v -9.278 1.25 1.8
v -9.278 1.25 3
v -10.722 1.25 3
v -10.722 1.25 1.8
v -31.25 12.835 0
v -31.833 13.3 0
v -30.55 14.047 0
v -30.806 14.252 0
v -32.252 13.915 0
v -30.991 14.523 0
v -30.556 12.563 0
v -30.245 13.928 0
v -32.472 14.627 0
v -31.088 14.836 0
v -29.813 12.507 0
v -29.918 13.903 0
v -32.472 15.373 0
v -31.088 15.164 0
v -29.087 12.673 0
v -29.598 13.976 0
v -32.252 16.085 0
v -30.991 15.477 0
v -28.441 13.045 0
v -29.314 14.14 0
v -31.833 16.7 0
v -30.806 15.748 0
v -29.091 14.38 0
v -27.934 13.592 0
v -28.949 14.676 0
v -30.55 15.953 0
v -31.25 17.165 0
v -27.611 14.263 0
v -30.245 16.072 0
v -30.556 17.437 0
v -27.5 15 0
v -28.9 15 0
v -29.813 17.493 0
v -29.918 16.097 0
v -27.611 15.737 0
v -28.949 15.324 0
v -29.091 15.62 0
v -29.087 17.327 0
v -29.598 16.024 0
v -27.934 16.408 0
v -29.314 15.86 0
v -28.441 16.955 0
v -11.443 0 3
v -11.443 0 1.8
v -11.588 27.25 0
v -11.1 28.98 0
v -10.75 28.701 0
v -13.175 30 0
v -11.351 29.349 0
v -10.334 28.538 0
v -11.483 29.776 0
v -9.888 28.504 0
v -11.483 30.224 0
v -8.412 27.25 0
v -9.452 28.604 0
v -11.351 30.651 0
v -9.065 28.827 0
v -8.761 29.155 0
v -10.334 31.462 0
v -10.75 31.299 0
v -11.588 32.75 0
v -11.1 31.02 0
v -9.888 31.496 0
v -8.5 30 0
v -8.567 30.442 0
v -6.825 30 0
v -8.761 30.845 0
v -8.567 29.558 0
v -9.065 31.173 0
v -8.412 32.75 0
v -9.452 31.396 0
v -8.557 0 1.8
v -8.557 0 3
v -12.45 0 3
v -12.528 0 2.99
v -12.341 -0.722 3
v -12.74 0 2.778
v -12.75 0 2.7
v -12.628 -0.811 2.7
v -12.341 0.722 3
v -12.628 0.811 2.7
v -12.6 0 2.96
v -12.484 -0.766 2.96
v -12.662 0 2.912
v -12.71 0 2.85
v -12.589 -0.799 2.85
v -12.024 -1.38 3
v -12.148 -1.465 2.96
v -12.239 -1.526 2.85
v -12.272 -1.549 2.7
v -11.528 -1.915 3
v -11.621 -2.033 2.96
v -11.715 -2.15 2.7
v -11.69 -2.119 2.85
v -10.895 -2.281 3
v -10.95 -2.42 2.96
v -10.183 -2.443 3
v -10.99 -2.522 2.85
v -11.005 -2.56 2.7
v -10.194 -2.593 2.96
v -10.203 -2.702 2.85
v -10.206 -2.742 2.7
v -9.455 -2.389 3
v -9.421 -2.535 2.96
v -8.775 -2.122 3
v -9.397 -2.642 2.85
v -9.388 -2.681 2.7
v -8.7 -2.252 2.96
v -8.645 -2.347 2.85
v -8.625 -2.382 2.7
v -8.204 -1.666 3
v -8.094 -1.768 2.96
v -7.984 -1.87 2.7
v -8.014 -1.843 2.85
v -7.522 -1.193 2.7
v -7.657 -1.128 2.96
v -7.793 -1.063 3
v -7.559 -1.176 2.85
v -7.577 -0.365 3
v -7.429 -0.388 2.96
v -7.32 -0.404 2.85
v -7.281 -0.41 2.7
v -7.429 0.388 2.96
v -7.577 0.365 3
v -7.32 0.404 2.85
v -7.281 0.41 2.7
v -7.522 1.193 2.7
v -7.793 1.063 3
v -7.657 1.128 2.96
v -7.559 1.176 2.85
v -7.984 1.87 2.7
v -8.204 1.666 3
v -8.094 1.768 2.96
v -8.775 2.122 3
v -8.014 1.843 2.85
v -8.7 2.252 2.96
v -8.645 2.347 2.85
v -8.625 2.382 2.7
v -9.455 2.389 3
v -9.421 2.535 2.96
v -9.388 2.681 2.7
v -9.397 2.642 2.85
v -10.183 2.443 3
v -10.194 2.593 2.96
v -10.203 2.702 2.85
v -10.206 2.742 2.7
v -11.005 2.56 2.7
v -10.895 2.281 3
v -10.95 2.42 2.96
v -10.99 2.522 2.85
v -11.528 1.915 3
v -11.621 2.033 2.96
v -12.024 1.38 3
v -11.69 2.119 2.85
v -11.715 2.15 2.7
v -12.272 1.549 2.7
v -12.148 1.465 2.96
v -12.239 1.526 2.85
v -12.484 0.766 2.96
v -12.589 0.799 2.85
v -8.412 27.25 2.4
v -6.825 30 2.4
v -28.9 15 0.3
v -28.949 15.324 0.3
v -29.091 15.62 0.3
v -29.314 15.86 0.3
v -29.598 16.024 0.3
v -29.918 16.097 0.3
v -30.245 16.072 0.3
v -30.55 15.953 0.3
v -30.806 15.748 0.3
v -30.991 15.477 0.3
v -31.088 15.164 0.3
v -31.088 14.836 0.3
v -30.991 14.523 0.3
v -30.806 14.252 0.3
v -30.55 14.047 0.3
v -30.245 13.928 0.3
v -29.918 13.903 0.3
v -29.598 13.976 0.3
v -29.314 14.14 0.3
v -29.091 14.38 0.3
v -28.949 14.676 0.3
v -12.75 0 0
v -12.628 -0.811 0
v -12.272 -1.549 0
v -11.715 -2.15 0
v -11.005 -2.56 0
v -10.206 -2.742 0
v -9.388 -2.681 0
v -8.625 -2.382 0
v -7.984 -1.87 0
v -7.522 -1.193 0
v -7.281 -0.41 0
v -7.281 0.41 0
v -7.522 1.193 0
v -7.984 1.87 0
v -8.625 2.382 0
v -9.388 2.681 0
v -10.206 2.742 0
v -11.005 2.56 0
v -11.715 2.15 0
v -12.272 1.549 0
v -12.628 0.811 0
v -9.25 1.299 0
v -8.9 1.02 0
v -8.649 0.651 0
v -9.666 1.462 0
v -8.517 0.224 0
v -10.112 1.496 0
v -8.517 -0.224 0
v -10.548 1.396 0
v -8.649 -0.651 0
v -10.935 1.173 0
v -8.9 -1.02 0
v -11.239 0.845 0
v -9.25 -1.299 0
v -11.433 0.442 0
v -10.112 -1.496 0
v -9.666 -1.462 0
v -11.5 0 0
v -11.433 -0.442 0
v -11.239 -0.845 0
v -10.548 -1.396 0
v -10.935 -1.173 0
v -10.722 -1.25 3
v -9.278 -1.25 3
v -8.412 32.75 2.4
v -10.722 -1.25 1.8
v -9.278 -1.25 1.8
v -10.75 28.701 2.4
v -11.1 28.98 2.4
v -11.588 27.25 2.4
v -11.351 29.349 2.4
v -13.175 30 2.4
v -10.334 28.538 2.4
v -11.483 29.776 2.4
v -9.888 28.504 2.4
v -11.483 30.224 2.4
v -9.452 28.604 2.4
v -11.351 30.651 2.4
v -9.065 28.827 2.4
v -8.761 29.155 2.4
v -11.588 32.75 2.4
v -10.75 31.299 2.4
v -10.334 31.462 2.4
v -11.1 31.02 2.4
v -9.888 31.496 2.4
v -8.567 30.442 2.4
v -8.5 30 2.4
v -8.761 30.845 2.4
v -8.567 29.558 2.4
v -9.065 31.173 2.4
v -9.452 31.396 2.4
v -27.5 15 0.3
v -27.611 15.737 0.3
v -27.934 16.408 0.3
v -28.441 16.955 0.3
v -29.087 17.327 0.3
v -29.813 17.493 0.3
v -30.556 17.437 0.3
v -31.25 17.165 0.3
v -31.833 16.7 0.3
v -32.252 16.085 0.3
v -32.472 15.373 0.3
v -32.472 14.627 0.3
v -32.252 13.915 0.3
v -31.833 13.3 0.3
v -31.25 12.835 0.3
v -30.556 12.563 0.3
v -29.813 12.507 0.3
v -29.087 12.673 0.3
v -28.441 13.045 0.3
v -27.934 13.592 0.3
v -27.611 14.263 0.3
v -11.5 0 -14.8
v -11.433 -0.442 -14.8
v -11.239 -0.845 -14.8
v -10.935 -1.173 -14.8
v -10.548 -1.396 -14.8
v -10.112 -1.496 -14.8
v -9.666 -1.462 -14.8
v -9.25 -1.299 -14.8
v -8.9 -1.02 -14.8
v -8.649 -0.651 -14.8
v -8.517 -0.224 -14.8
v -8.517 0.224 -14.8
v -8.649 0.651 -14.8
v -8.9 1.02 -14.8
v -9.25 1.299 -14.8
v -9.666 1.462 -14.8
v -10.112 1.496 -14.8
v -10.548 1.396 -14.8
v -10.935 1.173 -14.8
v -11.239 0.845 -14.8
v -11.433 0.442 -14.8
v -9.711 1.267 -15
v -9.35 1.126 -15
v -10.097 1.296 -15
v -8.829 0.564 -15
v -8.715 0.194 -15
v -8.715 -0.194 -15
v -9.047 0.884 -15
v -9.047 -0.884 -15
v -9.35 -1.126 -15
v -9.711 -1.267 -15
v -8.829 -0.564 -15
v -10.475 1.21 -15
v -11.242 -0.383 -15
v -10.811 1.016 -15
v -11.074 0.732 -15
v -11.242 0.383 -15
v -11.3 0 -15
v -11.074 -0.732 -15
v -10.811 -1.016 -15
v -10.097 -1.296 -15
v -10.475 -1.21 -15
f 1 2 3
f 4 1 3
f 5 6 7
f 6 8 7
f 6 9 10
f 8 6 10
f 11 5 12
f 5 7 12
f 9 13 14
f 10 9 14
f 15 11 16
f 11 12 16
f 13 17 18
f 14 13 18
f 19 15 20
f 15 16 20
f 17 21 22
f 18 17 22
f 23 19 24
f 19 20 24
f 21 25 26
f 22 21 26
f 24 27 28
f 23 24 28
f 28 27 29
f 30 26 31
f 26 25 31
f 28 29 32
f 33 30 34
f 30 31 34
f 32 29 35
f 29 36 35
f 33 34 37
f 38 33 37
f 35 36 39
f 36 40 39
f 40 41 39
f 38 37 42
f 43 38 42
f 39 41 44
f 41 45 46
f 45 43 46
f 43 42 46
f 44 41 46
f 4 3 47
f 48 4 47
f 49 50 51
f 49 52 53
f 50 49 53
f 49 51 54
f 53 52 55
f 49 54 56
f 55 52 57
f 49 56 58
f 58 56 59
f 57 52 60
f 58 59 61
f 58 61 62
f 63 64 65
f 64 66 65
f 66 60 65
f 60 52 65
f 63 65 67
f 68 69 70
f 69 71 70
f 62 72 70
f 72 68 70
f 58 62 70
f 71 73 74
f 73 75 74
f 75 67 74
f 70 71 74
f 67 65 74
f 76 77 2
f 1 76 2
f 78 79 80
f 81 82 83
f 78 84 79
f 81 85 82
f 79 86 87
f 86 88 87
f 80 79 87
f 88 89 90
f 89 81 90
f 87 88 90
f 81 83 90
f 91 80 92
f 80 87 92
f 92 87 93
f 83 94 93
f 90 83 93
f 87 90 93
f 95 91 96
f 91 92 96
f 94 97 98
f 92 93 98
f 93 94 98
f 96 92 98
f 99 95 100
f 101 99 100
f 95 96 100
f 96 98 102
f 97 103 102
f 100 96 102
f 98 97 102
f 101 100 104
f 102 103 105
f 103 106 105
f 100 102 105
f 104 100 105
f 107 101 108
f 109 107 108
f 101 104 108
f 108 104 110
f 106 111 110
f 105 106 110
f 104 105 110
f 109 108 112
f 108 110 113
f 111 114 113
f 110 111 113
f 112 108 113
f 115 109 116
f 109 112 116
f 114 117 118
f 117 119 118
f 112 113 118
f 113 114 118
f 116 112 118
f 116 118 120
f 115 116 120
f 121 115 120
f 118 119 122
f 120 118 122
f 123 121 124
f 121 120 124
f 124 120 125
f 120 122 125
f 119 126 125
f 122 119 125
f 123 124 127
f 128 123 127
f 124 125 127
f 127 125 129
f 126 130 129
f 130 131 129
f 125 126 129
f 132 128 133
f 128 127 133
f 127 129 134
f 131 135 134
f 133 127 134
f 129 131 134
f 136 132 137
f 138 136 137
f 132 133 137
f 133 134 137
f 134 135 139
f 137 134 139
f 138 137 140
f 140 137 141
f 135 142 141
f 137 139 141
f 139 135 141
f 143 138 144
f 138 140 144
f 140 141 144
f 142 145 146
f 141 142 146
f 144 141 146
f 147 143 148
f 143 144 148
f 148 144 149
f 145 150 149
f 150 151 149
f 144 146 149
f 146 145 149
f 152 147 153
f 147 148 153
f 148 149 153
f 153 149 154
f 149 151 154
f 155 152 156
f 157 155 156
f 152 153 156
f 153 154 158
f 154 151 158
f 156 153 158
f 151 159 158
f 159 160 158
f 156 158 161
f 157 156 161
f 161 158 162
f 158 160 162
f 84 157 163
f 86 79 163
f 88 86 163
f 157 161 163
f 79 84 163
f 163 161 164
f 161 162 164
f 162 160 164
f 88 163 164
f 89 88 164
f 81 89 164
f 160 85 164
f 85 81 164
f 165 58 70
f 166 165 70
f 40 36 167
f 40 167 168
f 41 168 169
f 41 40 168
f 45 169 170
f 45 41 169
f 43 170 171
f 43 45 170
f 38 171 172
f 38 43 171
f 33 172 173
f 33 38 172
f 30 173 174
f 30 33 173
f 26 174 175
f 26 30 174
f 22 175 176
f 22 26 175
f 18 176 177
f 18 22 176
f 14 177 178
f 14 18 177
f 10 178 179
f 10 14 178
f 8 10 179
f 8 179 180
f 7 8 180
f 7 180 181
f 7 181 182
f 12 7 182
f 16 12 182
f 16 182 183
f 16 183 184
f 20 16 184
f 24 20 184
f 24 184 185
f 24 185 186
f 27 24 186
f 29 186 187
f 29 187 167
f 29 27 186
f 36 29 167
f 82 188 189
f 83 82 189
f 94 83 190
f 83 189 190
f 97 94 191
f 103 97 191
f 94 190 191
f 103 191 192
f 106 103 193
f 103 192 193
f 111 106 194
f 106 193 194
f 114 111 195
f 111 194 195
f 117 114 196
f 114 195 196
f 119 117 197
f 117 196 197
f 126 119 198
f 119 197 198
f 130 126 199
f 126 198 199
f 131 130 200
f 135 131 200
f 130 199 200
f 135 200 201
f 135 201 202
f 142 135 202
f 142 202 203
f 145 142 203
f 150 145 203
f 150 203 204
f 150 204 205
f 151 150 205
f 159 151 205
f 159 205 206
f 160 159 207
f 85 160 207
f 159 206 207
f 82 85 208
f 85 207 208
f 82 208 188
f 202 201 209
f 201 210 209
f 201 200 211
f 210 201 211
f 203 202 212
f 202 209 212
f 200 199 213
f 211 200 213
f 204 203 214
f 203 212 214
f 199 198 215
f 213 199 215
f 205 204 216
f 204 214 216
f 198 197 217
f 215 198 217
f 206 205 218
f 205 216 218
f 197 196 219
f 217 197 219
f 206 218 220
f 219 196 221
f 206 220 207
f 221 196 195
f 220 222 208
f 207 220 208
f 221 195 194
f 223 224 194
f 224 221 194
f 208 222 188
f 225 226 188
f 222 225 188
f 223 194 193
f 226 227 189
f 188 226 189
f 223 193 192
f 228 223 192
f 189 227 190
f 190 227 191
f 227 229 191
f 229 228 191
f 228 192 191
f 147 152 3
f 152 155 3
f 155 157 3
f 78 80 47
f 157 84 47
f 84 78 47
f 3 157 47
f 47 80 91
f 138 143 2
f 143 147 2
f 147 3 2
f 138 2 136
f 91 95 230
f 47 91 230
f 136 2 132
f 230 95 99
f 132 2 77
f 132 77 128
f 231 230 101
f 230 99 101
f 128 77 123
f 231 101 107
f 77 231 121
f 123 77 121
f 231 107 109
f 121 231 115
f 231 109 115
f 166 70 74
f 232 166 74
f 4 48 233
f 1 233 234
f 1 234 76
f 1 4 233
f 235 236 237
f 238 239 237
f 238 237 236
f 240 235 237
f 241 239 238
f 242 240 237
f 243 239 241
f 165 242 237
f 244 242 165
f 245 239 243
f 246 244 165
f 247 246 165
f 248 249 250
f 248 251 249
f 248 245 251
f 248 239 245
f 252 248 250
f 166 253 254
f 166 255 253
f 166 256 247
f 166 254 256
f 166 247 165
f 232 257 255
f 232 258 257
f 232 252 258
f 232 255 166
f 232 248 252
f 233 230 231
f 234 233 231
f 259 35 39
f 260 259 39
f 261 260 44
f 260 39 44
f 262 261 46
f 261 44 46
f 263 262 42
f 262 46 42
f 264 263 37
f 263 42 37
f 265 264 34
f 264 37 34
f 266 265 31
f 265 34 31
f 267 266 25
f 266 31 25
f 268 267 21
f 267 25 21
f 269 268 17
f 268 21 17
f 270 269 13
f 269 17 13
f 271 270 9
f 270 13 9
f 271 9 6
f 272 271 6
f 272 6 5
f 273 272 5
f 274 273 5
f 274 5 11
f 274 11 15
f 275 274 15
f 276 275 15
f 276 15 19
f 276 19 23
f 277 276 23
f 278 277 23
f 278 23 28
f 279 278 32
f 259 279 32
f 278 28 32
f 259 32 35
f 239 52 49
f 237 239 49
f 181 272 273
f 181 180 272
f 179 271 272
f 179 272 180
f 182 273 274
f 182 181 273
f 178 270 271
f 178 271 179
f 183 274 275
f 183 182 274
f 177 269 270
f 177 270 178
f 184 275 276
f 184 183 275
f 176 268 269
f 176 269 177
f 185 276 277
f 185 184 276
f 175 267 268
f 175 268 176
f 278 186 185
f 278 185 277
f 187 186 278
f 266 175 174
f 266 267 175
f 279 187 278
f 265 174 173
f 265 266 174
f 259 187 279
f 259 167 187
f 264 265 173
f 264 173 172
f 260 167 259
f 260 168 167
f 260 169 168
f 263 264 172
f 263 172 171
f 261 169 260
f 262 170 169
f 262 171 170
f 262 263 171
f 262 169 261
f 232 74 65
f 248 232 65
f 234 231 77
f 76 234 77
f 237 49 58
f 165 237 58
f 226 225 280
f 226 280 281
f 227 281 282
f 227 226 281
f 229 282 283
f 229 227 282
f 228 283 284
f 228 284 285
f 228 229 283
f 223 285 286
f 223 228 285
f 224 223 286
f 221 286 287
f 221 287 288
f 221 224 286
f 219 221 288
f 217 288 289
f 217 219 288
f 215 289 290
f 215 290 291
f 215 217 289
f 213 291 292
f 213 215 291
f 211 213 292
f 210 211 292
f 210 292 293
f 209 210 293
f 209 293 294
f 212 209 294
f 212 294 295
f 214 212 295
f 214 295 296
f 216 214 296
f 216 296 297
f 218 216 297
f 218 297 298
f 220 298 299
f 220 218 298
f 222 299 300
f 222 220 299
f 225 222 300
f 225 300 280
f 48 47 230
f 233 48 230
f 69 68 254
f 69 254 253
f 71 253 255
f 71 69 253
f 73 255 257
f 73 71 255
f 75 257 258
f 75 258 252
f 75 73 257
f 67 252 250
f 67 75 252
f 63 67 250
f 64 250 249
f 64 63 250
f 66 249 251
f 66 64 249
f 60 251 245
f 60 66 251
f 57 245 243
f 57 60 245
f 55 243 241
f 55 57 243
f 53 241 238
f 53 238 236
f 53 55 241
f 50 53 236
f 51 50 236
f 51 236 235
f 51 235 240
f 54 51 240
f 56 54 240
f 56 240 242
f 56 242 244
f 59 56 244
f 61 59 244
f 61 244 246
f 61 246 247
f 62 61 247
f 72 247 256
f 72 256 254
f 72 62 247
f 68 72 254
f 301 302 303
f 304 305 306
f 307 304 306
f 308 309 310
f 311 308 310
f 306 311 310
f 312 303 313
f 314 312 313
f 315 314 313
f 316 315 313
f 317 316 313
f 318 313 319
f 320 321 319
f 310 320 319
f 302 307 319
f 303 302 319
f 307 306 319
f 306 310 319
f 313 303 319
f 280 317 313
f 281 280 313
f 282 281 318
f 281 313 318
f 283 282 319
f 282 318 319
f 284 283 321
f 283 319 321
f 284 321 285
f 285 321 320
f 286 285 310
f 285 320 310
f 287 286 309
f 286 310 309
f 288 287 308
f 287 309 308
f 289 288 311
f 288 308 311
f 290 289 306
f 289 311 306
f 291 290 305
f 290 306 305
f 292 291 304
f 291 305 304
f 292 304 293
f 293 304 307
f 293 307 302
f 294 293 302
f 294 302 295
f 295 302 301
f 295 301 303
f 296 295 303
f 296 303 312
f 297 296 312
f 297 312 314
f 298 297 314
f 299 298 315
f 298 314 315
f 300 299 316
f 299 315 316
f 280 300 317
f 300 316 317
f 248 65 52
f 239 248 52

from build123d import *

# Parameters (mm, degrees)
F0_W      = 1.5
F0_H      = 15
F2_R      = 0.3
F4_DEPTH  = 1.2
F5_SIZE   = 0.2
F6_W      = 1.25
F6_H      = 15
F9_DEPTH  = 1.1
F10_R     = 0.2
F11_SIZE  = 0.2
F12_W     = 1
F12_H     = 15
F15_DEPTH = 1
F16_R     = 0.2
F17_SIZE  = 0.1
F18_R     = 2.5
F18_R_2   = 1.1
F19_DEPTH = 0.3
F18_R_3   = 3
F18_R_4   = 1.35
F20_DEPTH = 0.5
F18_R_5   = 3.5
F18_R_6   = 1.6
F21_DEPTH = 0.5
F22_R     = 1
F23_DEPTH = 1.6
F22_R_2   = 1.25
F24_DEPTH = 2
F22_R_3   = 1.5
F25_DEPTH = 2.4
F26_W     = 3
F26_H     = 25
F29_DEPTH = 3
F18_R_7   = 6
F18_R_8   = 3.2
F30_DEPTH = 1.4
F22_R_4   = 3
F31_DEPTH = 5


with BuildPart() as f1:
    # F0 (on Front) → F1 (revolve)
    with BuildSketch(Plane.XZ):
        with Locations((-10.75, -7.5)):
            Rectangle(F0_W, F0_H)
        Polygon((-11.5, 0), (-10, 0), (-10, 3), (-12.75, 3), (-12.75, 0), align=None)
    revolve(axis=Axis((-10, 0, -0.8508423006), (0, 0, 1)))

    # F2
    f2_edges = [f1.edges().sort_by_distance(p)[0] for p in [
        (-7.25, 0, 3),
    ]]
    fillet(f2_edges, radius=F2_R)

    # F3 (on face) → F4 (cut)
    with BuildSketch(Plane.XY.offset(3)):
        Polygon((-10.7216878365, 1.25), (-11.443375673, 0), (-10.7216878365, -1.25), (-9.2783121635, -1.25), (-8.556624327, 0), (-9.2783121635, 1.25), align=None)
    extrude(amount=-F4_DEPTH, mode=Mode.SUBTRACT)

    # F5
    f5_edges = [f1.edges().sort_by_distance(p)[0] for p in [
        (-8.5, 0, -15),
    ]]
    chamfer(f5_edges, length=F5_SIZE)


with BuildPart() as f7:
    # F6 (on Front) → F7 (revolve)
    with BuildSketch(Plane.XZ):
        Polygon((-21.25, 0), (-20, 0), (-20, 2.5), (-22.25, 2.5), (-22.25, 0), align=None)
        with Locations((-20.625, -7.5)):
            Rectangle(F6_W, F6_H)
    revolve(axis=Axis((-20, 0, -5.1652500254), (0, 0, -1)))

    # F8 (on face) → F9 (cut)
    with BuildSketch(Plane.XY.offset(2.5)):
        Polygon((-20.5773502692, 1), (-21.1547005384, 0), (-20.5773502692, -1), (-19.4226497308, -1), (-18.8452994616, 0), (-19.4226497308, 1), align=None)
    extrude(amount=-F9_DEPTH, mode=Mode.SUBTRACT)

    # F10
    f10_edges = [f7.edges().sort_by_distance(p)[0] for p in [
        (-17.75, 0, 2.5),
    ]]
    fillet(f10_edges, radius=F10_R)

    # F11
    f11_edges = [f7.edges().sort_by_distance(p)[0] for p in [
        (-18.75, 0, -15),
    ]]
    chamfer(f11_edges, length=F11_SIZE)


with BuildPart() as f13:
    # F12 (on Front) → F13 (revolve)
    with BuildSketch(Plane.XZ):
        with Locations((-30.5, -7.5)):
            Rectangle(F12_W, F12_H)
        Polygon((-31, 0), (-30, 0), (-30, 2), (-31.9, 2), (-31.9, 0), align=None)
    revolve(axis=Axis((-30, 0, -5.8312802576), (0, 0, -1)))

    # F14 (on face) → F15 (cut)
    with BuildSketch(Plane.XY.offset(2)):
        Polygon((-30.5773502692, 1), (-31.1547005384, 0), (-30.5773502692, -1), (-29.4226497308, -1), (-28.8452994616, 0), (-29.4226497308, 1), align=None)
    extrude(amount=-F15_DEPTH, mode=Mode.SUBTRACT)

    # F16
    f16_edges = [f13.edges().sort_by_distance(p)[0] for p in [
        (-28.1, 0, 2),
    ]]
    fillet(f16_edges, radius=F16_R)

    # F17
    f17_edges = [f13.edges().sort_by_distance(p)[0] for p in [
        (-29, 0, -15),
    ]]
    chamfer(f17_edges, length=F17_SIZE)


with BuildPart() as f19:
    # F18 (on Top) → F19 (new body)
    with BuildSketch(Plane.XY):
        with Locations((-30, 15)):
            Circle(F18_R)
        with Locations((-30, 15)):
            Circle(F18_R_2, mode=Mode.SUBTRACT)
    extrude(amount=F19_DEPTH)


with BuildPart() as f20:
    # F18 (on Top) → F20 (new body)
    with BuildSketch(Plane.XY):
        with Locations((-20, 15)):
            Circle(F18_R_3)
        with Locations((-20, 15)):
            Circle(F18_R_4, mode=Mode.SUBTRACT)
    extrude(amount=F20_DEPTH)


with BuildPart() as f21:
    # F18 (on Top) → F21 (new body)
    with BuildSketch(Plane.XY):
        with Locations((-10, 15)):
            Circle(F18_R_5)
        with Locations((-10, 15)):
            Circle(F18_R_6, mode=Mode.SUBTRACT)
    extrude(amount=F21_DEPTH)


with BuildPart() as f23:
    # F22 (on Top) → F23 (new body)
    with BuildSketch(Plane.XY):
        Polygon((-28.8452994616, 32), (-31.1547005384, 32), (-32.3094010768, 30), (-31.1547005384, 28), (-28.8452994616, 28), (-27.6905989232, 30), align=None)
        with Locations((-30, 30)):
            Circle(F22_R, mode=Mode.SUBTRACT)
    extrude(amount=F23_DEPTH)


with BuildPart() as f24:
    # F22 (on Top) → F24 (new body)
    with BuildSketch(Plane.XY):
        Polygon((-18.556624327, 32.5), (-21.443375673, 32.5), (-22.8867513459, 30), (-21.443375673, 27.5), (-18.556624327, 27.5), (-17.1132486541, 30), align=None)
        with Locations((-20, 30)):
            Circle(F22_R_2, mode=Mode.SUBTRACT)
    extrude(amount=F24_DEPTH)


with BuildPart() as f25:
    # F22 (on Top) → F25 (new body)
    with BuildSketch(Plane.XY):
        Polygon((-8.4122867597, 32.75), (-11.5877132403, 32.75), (-13.1754264805, 30), (-11.5877132403, 27.25), (-8.4122867597, 27.25), (-6.8245735195, 30), align=None)
        with Locations((-10, 30)):
            Circle(F22_R_3, mode=Mode.SUBTRACT)
    extrude(amount=F25_DEPTH)


with BuildPart() as f27:
    # F26 (on Front) → F27 (revolve)
    with BuildSketch(Plane.XZ):
        with Locations((6.889186867, -12.3765884969)):
            Rectangle(F26_W, F26_H)
        Polygon((5.389186867, 0.1234115031), (8.389186867, 0.1234115031), (8.389186867, 6.1234115031), (3.389186867, 6.1234115031), (3.389186867, 0.1234115031), align=None)
    revolve(axis=Axis((8.389186867, 0, -0.7274307974), (0, 0, 1)))

    # F28 (on face) → F29 (cut)
    with BuildSketch(Plane.XY.offset(6.1234115031)):
        Polygon((10.889186867, -1.443375673), (10.889186867, 1.443375673), (8.389186867, 2.8867513459), (5.889186867, 1.443375673), (5.889186867, -1.443375673), (8.389186867, -2.8867513459), align=None)
    extrude(amount=-F29_DEPTH, mode=Mode.SUBTRACT)


with BuildPart() as f30:
    # F18 (on Top) → F30 (new body)
    with BuildSketch(Plane.XY):
        with Locations((10, 15)):
            Circle(F18_R_7)
        with Locations((10, 15)):
            Circle(F18_R_8, mode=Mode.SUBTRACT)
    extrude(amount=F30_DEPTH)


with BuildPart() as f31:
    # F22 (on Top) → F31 (new body)
    with BuildSketch(Plane.XY):
        Polygon((12.8867513459, 35), (7.1132486541, 35), (4.2264973081, 30), (7.1132486541, 25), (12.8867513459, 25), (15.7735026919, 30), align=None)
        with Locations((10, 30)):
            Circle(F22_R_4, mode=Mode.SUBTRACT)
    extrude(amount=F31_DEPTH)


solid = Compound([f1.part, f19.part, f25.part])
